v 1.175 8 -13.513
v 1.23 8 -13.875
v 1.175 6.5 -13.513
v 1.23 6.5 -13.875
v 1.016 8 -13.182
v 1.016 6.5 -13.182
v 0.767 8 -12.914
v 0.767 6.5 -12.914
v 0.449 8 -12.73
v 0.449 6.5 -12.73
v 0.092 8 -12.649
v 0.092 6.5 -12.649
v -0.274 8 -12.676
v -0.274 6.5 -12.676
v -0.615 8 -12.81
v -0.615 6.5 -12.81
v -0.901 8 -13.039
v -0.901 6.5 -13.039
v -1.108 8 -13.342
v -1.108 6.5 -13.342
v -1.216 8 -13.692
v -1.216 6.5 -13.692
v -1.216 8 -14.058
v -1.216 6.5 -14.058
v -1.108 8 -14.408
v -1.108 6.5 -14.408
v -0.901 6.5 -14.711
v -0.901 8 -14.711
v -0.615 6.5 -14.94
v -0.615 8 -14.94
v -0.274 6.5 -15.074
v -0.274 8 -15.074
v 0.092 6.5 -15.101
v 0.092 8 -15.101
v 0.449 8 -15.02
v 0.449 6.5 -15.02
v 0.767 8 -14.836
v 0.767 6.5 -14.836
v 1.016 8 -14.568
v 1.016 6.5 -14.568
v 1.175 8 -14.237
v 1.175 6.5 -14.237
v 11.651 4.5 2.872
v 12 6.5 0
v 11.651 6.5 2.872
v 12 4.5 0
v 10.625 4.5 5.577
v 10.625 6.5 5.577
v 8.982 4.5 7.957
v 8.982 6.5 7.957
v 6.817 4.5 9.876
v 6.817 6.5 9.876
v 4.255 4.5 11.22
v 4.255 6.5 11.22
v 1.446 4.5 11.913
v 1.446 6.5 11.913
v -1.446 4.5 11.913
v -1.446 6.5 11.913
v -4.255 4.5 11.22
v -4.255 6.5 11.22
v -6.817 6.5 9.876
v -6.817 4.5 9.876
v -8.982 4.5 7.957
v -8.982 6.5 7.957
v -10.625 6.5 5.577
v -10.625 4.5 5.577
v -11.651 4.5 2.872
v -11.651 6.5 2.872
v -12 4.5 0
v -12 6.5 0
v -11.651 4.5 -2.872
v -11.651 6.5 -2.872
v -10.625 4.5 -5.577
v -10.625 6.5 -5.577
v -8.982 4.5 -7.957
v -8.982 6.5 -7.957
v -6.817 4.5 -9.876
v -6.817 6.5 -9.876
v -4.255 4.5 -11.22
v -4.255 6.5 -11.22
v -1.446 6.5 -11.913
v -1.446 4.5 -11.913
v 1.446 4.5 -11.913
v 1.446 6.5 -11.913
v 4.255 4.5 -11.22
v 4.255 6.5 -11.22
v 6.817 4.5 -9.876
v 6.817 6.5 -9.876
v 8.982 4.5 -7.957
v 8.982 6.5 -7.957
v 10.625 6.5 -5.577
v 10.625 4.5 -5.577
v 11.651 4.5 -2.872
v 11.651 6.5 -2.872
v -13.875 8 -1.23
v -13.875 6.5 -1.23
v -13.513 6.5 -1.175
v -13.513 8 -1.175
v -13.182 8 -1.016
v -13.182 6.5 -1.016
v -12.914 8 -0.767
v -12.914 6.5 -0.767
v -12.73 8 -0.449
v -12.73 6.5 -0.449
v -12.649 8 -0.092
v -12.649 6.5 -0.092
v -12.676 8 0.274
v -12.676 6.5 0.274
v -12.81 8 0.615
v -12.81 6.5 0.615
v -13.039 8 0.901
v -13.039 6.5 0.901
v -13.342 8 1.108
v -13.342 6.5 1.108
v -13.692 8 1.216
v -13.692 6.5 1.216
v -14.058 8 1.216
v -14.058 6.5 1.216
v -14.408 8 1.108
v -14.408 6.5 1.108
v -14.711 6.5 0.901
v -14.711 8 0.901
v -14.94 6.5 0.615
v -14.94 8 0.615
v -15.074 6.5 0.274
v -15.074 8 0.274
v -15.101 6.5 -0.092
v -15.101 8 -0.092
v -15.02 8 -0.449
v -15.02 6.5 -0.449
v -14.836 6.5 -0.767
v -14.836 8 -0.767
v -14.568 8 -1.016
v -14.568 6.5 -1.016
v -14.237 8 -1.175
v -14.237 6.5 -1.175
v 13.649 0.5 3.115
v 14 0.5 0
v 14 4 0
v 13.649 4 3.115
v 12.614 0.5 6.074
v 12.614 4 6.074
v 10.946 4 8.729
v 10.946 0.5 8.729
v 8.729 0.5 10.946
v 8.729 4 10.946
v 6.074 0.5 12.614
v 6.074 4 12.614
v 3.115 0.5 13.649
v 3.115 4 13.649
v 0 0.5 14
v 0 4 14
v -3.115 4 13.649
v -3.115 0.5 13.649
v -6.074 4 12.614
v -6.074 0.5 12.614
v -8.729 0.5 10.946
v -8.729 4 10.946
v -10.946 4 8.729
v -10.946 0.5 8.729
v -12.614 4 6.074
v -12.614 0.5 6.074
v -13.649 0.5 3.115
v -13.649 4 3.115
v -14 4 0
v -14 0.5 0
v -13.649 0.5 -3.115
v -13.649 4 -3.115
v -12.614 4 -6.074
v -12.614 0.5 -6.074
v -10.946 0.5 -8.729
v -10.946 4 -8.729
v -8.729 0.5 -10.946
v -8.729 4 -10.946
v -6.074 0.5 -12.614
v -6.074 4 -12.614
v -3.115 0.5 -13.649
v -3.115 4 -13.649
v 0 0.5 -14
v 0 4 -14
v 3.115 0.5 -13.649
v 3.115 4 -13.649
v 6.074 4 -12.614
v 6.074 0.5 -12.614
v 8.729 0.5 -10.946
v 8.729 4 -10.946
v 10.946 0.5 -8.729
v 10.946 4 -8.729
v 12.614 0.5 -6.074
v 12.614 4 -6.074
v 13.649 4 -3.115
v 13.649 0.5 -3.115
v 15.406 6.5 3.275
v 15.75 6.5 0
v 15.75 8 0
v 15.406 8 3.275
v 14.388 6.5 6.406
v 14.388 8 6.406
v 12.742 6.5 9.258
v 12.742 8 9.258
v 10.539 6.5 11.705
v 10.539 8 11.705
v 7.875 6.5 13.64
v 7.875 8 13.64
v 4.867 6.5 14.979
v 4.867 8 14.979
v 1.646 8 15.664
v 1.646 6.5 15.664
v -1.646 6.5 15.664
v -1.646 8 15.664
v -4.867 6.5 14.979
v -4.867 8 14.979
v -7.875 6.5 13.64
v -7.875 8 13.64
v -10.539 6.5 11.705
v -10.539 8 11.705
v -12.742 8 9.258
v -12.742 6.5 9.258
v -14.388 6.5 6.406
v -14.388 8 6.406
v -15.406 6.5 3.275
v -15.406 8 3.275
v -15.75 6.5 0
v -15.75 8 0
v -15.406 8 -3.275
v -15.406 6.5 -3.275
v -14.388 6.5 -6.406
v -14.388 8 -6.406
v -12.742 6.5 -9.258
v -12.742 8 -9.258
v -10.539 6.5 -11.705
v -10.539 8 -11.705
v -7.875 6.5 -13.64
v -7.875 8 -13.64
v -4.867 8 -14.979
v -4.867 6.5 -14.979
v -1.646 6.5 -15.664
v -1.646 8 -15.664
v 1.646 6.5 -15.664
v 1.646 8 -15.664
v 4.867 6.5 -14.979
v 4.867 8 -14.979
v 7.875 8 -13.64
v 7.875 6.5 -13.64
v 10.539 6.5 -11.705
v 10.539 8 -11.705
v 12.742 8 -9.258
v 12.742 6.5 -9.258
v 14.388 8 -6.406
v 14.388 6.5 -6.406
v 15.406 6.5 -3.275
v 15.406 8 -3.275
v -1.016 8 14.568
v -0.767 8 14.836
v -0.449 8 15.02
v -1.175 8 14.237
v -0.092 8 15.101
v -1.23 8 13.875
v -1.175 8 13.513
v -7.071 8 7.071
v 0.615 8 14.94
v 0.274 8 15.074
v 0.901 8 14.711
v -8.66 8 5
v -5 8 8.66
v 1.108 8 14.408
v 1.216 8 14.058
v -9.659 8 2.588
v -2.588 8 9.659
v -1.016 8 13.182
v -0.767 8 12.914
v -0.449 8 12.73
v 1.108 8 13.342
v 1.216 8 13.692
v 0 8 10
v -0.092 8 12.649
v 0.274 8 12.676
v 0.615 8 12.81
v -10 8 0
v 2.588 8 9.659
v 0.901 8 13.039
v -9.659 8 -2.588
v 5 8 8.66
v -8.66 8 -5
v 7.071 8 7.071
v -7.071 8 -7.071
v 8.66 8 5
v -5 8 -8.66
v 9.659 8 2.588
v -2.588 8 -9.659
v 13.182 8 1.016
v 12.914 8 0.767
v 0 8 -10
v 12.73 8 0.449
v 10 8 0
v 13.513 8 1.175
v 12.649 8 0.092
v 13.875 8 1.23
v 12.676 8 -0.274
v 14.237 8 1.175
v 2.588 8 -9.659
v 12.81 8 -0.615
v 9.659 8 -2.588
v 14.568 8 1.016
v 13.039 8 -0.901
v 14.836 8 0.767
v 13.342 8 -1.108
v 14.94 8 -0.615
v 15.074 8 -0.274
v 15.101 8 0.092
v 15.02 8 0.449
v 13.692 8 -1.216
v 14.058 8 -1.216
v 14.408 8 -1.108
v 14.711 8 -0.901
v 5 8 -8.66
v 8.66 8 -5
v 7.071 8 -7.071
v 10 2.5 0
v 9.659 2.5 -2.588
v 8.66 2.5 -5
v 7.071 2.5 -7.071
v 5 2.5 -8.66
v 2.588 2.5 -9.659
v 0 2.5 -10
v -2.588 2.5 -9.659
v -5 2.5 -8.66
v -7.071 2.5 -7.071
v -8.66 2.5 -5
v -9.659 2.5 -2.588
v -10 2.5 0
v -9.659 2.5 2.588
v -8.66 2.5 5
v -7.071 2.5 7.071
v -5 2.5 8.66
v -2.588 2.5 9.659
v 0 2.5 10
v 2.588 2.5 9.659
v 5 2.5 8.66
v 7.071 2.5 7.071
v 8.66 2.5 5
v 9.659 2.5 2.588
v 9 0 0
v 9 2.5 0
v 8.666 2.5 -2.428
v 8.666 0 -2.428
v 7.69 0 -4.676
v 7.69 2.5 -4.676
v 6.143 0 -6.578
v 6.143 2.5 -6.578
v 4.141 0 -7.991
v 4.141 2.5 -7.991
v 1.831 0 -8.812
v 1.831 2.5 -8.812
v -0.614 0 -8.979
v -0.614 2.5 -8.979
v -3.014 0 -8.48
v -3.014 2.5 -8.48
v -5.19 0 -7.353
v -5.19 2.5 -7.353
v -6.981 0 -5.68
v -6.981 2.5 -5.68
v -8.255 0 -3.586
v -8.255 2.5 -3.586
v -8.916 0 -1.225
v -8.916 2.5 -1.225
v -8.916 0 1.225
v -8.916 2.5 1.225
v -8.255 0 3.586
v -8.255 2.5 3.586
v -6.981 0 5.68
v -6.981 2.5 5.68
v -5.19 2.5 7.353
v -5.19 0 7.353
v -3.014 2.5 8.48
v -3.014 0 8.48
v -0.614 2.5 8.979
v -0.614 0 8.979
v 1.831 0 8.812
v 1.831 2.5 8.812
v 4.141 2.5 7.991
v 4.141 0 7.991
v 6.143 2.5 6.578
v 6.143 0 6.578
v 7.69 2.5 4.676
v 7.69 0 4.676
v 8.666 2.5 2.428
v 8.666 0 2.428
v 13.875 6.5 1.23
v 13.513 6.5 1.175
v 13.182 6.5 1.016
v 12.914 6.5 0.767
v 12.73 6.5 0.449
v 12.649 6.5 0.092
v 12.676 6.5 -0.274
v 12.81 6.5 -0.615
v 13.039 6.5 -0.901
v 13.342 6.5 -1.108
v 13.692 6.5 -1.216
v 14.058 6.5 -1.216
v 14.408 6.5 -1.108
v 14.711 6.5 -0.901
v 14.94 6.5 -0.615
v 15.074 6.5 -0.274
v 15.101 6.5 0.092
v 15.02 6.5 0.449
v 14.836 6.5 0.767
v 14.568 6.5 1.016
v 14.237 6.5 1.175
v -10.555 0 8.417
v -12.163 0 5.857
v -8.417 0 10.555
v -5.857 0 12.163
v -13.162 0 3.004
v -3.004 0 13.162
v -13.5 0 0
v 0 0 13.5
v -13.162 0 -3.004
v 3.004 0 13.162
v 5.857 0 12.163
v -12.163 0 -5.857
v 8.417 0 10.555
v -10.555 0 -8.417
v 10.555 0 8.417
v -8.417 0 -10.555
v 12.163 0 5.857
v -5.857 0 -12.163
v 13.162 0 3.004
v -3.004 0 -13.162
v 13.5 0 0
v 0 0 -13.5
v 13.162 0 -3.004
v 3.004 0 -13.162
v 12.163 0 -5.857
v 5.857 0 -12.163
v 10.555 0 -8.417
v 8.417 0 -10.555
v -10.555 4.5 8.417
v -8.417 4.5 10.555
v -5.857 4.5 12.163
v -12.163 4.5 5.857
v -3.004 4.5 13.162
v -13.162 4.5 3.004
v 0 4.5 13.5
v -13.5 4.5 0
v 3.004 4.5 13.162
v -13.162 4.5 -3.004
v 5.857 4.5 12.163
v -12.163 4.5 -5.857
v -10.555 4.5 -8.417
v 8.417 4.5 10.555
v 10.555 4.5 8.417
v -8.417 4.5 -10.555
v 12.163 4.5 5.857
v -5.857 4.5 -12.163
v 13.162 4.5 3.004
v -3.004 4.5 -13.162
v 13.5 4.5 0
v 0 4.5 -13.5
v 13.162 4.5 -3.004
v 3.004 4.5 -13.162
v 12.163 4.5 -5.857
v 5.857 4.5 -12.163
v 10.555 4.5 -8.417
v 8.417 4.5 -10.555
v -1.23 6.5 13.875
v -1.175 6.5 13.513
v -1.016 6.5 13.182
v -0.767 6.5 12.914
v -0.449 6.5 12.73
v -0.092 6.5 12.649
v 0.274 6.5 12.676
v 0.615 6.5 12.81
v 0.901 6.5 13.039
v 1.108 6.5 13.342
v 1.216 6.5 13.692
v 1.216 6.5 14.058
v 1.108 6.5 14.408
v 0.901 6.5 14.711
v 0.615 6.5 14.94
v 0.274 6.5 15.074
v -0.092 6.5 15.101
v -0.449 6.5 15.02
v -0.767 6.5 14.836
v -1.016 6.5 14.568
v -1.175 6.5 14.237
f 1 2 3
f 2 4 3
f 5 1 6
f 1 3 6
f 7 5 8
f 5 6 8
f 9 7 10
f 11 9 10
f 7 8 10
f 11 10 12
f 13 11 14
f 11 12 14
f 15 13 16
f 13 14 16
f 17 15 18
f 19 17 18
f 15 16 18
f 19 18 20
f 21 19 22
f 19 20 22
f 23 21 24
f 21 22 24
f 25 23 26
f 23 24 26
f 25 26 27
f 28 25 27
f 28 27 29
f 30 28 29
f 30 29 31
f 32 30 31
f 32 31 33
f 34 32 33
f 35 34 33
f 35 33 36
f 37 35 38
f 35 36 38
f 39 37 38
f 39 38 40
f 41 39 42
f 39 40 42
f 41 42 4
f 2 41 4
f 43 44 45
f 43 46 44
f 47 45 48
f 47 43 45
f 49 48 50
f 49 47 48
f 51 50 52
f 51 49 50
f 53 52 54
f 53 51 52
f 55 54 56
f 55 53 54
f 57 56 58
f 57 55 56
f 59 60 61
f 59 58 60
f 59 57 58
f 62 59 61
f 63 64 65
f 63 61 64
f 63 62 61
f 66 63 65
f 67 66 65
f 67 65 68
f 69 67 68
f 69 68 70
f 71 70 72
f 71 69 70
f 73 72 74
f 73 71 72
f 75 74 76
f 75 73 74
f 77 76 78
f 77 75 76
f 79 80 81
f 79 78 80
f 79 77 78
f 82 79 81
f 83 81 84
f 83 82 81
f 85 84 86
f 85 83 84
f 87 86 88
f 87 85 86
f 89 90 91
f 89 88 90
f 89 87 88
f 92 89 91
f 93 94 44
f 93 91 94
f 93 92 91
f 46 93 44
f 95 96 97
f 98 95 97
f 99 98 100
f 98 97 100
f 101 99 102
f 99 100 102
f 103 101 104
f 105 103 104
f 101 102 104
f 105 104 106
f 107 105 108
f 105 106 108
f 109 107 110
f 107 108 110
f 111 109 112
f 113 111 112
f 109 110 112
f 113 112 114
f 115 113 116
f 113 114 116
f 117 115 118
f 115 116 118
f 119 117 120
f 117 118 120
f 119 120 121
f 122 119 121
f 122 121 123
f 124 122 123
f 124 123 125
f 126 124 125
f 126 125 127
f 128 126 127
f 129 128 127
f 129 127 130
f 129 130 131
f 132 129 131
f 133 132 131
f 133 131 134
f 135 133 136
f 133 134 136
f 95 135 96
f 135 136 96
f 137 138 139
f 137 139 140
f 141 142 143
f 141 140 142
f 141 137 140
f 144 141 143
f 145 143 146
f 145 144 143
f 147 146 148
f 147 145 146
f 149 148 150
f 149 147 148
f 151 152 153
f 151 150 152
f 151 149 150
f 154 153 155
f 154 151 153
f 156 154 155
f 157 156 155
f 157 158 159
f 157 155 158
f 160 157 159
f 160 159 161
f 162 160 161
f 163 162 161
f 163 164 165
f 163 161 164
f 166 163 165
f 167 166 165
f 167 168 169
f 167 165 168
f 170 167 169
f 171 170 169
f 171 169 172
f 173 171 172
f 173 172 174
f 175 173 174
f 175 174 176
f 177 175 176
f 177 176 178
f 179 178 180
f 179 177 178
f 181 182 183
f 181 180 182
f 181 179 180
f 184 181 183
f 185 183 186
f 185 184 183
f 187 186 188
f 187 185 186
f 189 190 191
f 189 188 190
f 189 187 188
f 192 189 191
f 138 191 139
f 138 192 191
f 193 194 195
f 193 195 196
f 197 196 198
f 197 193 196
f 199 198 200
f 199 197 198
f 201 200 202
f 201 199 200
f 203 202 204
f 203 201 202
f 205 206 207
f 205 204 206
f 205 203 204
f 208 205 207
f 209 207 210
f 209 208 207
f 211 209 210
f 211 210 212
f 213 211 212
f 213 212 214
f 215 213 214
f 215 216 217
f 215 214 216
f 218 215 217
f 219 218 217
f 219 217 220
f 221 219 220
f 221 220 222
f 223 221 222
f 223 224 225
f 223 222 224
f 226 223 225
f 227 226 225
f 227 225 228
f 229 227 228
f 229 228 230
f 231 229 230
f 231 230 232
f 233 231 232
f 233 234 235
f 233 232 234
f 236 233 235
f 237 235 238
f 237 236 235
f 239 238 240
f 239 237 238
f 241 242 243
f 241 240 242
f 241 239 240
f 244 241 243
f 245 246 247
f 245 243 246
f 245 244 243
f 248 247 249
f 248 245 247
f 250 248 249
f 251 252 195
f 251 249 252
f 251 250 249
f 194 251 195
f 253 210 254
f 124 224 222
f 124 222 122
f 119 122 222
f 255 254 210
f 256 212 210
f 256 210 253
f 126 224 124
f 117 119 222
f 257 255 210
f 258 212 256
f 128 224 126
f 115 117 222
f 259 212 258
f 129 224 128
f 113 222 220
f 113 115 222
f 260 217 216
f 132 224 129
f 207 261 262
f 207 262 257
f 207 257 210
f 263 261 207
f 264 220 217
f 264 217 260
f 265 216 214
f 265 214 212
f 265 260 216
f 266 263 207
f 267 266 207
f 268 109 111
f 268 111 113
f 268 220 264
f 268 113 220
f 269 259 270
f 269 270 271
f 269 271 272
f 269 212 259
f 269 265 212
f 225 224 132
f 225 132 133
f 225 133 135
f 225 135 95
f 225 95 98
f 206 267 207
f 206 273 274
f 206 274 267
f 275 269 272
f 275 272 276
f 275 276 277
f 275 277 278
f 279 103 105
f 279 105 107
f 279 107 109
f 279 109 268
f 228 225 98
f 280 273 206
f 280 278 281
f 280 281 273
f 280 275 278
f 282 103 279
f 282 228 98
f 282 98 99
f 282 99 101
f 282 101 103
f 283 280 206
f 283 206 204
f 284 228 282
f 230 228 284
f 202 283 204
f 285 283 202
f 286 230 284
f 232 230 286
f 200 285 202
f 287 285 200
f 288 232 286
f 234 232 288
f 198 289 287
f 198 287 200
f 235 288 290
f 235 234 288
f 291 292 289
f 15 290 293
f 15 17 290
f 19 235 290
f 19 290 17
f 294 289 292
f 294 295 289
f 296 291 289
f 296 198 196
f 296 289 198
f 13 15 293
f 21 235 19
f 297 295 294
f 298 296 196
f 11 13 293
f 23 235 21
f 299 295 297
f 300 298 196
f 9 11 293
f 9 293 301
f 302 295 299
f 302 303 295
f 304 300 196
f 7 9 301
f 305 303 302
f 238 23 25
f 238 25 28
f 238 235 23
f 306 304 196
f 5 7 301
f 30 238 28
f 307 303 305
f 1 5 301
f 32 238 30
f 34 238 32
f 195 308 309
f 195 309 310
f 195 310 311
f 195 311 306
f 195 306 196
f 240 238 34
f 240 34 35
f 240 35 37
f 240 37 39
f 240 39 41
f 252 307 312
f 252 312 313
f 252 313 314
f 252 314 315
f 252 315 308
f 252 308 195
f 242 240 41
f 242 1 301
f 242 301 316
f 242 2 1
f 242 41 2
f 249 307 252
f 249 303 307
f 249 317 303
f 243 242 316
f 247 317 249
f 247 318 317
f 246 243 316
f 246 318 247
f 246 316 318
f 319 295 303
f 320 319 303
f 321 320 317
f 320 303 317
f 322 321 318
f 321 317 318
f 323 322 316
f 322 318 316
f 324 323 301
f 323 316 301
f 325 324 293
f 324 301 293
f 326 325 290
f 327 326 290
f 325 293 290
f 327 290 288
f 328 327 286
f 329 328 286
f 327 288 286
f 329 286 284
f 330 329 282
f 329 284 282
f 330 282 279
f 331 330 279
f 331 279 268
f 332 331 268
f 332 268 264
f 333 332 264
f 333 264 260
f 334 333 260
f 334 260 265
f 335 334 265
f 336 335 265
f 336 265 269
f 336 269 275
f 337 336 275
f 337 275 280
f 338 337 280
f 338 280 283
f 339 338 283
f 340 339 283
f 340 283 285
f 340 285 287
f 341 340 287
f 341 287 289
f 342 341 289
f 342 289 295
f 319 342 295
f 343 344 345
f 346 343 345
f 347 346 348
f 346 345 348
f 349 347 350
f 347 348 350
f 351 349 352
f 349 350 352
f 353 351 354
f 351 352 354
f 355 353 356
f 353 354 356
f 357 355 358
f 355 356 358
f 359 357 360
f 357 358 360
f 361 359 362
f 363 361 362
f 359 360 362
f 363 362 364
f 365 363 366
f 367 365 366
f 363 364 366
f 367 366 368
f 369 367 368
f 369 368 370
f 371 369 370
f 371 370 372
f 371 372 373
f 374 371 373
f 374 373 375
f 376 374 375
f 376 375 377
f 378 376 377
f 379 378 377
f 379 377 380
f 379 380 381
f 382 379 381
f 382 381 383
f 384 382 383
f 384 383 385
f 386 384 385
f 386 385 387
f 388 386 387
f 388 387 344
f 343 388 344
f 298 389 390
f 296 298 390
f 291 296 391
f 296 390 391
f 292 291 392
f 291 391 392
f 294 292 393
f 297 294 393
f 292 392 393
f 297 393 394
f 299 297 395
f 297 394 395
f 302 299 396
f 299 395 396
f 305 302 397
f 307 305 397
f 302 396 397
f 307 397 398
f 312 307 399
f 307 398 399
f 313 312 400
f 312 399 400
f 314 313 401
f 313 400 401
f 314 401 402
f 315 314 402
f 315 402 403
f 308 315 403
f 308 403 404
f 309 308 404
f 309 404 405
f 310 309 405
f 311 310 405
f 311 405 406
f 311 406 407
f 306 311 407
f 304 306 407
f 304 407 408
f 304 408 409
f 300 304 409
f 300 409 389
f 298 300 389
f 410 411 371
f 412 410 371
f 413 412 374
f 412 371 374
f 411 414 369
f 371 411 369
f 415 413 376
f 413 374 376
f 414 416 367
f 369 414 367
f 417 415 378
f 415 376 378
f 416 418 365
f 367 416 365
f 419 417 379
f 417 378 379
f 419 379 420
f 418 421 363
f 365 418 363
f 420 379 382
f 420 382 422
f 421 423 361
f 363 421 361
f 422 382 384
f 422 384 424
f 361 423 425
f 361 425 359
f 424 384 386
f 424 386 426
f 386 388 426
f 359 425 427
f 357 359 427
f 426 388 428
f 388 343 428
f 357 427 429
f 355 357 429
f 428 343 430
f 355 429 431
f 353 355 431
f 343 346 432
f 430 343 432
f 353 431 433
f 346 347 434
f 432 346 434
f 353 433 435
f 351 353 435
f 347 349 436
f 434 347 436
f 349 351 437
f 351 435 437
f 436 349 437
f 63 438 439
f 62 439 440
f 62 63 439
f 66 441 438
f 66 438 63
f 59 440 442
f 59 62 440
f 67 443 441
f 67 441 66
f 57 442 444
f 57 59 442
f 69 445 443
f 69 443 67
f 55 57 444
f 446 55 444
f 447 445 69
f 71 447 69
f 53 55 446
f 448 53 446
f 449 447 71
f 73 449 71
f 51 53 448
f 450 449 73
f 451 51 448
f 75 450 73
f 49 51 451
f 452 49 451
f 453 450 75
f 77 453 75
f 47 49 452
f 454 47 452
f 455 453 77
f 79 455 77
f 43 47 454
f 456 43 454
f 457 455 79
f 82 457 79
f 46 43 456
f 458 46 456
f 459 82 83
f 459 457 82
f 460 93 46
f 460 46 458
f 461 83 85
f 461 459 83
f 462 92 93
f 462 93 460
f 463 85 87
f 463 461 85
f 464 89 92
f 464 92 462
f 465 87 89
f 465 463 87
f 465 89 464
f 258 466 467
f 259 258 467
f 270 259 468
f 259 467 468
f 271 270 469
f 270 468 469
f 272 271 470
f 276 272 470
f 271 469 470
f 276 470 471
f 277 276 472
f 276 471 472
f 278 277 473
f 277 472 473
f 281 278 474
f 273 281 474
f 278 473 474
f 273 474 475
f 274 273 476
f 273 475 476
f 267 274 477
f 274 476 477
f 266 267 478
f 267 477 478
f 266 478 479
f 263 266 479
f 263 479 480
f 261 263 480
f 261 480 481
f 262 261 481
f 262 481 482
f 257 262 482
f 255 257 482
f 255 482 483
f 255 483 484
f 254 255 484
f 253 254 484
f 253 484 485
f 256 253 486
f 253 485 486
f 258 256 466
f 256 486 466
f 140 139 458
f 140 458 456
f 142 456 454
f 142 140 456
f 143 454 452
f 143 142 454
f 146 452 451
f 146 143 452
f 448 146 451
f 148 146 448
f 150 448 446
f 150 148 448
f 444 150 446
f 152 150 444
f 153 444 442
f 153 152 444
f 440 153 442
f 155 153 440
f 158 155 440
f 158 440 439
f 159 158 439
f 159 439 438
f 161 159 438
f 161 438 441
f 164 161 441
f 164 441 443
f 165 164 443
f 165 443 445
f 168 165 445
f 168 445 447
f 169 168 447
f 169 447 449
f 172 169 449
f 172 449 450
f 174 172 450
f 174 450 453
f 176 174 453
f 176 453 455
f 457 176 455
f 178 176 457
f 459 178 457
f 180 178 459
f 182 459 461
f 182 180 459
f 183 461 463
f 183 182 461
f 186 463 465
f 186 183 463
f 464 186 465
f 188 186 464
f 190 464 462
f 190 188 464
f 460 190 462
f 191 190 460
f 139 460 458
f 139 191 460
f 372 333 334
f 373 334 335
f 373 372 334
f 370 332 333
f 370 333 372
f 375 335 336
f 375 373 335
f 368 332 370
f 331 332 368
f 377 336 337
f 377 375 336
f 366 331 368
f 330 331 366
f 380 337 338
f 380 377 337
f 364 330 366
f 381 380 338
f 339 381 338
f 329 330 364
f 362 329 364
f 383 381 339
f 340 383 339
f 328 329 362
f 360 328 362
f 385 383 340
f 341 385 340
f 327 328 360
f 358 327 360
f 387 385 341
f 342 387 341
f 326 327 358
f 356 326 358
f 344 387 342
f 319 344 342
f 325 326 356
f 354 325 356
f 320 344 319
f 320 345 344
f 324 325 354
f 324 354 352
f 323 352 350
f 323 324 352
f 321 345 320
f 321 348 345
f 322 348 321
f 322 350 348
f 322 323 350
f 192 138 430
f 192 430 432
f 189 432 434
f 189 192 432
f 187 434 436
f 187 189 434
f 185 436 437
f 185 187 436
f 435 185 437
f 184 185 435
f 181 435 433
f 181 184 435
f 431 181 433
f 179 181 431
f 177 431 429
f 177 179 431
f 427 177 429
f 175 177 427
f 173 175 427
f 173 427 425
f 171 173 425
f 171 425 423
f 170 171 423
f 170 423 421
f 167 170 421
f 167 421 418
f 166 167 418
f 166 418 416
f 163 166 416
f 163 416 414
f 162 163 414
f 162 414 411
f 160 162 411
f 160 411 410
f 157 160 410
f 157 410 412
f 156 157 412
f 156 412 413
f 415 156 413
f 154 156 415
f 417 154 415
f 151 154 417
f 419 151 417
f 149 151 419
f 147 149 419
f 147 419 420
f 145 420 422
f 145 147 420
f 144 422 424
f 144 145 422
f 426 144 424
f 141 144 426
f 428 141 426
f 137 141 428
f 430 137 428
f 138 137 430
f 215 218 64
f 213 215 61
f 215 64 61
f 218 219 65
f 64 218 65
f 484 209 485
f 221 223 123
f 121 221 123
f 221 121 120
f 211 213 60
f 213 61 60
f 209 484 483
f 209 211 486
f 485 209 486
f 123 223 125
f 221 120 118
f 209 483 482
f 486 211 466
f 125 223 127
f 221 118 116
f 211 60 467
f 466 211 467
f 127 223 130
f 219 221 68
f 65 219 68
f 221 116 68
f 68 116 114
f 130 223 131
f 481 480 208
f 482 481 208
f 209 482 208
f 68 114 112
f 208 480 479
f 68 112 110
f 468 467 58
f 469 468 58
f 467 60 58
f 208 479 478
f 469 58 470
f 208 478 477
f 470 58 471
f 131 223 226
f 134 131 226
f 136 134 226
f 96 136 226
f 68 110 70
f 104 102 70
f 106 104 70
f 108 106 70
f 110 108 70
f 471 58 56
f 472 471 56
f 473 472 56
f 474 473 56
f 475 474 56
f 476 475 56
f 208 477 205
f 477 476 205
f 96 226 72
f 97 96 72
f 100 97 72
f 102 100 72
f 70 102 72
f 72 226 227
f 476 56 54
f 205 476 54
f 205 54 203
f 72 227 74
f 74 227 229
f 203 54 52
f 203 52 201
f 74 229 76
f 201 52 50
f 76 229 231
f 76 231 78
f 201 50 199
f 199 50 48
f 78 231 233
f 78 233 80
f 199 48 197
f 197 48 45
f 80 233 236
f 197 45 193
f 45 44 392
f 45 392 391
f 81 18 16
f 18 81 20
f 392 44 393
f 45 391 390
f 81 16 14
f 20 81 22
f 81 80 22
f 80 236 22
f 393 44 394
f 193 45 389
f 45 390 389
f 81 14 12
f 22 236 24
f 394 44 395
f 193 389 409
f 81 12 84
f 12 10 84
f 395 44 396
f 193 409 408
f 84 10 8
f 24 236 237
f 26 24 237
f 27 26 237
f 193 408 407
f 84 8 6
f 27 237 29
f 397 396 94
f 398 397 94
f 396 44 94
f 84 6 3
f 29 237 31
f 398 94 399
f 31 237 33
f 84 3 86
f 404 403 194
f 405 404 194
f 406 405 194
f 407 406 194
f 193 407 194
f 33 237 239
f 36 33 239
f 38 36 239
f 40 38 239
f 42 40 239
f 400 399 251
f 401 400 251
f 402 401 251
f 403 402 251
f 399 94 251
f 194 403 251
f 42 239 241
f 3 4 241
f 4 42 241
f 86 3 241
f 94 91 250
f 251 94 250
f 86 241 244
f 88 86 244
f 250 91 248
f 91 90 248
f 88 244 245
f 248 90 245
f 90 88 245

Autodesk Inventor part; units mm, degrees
ref_plane "YZ Plane" through (0, 0, 0) normal (1, 0, 0) x (0, 1, 0)
ref_plane "XZ Plane" through (0, 0, 0) normal (0, 1, 0) x (-1, 0, 0)
ref_plane "XY Plane" through (0, 0, 0) normal (0, 0, 1) x (1, 0, 0)
sketch "Sketch1" plane through (0, 0, 0) normal (0, 0, 1) x (1, 0, 0)
  line L0 (0, 0) -> (0, 8)
  line L1 (9, 0) -> (9, 2.5)
  line L2 (9, 2.5) -> (10, 2.5)
  line L3 (10, 2.5) -> (10, 8)
  line L4 (10, 8) -> (12, 8)
  line L5 (12, 8) -> (12, 4.5)
  line L6 (12, 4.5) -> (14, 4.5)
  line L7 (14, 4.5) -> (14, 0)
  line L8 (14, 0) -> (9, 0)
  line L9 (12, 8) -> (15.75, 8)
  line L10 (15.75, 8) -> (15.75, 6.5)
  line L11 (15.75, 6.5) -> (12, 6.5)
  dimension "d0" = 18
  dimension "d2" = 2
  dimension "d3" = 2
  dimension "d4" = 4.5
  dimension "d5" = 20
  dimension "d13" = 28
  dimension "d14" = 1.5
  dimension "d15" = 31.5
  dimension "d28" = 2
revolve "Revolution1" add sketch "Sketch1" angle 360 about axis through (0, 0, 0) along (0, 1, 0)
chamfer "Chamfer1" distance 0.5 angle 45 2 edges at (-14, 4.5, 0) (-14, 0, 0)
thread "Thread1" size "M28x1" class "6g" standard "ANSI Metric M Profile" full length
sketch "Sketch3" plane through (0, 8, 0) normal (0, 1, 0) x (1, 0, 0)
  circle A0 centre (0, 0) radius 15.75 projected
  circle A1 centre (0, 0) radius 12 projected
  line L0 (12, 0) -> (15.75, 0)
  point P0 (13.875, 0)
hole "Hole2" at (13.875, 8, 0) direction (0, -1, 0) diameter 2.459 depth 1.5 thread size "M3x0.5" class "6H" standard "ISO Metric profile"
pattern_circular "Circular Pattern2" count 4 over 360 about axis through (0, 5.25, 0) along (0, -1, 0) of "Hole2"
equation "\"d3\" = d2"
properties part number "018"
